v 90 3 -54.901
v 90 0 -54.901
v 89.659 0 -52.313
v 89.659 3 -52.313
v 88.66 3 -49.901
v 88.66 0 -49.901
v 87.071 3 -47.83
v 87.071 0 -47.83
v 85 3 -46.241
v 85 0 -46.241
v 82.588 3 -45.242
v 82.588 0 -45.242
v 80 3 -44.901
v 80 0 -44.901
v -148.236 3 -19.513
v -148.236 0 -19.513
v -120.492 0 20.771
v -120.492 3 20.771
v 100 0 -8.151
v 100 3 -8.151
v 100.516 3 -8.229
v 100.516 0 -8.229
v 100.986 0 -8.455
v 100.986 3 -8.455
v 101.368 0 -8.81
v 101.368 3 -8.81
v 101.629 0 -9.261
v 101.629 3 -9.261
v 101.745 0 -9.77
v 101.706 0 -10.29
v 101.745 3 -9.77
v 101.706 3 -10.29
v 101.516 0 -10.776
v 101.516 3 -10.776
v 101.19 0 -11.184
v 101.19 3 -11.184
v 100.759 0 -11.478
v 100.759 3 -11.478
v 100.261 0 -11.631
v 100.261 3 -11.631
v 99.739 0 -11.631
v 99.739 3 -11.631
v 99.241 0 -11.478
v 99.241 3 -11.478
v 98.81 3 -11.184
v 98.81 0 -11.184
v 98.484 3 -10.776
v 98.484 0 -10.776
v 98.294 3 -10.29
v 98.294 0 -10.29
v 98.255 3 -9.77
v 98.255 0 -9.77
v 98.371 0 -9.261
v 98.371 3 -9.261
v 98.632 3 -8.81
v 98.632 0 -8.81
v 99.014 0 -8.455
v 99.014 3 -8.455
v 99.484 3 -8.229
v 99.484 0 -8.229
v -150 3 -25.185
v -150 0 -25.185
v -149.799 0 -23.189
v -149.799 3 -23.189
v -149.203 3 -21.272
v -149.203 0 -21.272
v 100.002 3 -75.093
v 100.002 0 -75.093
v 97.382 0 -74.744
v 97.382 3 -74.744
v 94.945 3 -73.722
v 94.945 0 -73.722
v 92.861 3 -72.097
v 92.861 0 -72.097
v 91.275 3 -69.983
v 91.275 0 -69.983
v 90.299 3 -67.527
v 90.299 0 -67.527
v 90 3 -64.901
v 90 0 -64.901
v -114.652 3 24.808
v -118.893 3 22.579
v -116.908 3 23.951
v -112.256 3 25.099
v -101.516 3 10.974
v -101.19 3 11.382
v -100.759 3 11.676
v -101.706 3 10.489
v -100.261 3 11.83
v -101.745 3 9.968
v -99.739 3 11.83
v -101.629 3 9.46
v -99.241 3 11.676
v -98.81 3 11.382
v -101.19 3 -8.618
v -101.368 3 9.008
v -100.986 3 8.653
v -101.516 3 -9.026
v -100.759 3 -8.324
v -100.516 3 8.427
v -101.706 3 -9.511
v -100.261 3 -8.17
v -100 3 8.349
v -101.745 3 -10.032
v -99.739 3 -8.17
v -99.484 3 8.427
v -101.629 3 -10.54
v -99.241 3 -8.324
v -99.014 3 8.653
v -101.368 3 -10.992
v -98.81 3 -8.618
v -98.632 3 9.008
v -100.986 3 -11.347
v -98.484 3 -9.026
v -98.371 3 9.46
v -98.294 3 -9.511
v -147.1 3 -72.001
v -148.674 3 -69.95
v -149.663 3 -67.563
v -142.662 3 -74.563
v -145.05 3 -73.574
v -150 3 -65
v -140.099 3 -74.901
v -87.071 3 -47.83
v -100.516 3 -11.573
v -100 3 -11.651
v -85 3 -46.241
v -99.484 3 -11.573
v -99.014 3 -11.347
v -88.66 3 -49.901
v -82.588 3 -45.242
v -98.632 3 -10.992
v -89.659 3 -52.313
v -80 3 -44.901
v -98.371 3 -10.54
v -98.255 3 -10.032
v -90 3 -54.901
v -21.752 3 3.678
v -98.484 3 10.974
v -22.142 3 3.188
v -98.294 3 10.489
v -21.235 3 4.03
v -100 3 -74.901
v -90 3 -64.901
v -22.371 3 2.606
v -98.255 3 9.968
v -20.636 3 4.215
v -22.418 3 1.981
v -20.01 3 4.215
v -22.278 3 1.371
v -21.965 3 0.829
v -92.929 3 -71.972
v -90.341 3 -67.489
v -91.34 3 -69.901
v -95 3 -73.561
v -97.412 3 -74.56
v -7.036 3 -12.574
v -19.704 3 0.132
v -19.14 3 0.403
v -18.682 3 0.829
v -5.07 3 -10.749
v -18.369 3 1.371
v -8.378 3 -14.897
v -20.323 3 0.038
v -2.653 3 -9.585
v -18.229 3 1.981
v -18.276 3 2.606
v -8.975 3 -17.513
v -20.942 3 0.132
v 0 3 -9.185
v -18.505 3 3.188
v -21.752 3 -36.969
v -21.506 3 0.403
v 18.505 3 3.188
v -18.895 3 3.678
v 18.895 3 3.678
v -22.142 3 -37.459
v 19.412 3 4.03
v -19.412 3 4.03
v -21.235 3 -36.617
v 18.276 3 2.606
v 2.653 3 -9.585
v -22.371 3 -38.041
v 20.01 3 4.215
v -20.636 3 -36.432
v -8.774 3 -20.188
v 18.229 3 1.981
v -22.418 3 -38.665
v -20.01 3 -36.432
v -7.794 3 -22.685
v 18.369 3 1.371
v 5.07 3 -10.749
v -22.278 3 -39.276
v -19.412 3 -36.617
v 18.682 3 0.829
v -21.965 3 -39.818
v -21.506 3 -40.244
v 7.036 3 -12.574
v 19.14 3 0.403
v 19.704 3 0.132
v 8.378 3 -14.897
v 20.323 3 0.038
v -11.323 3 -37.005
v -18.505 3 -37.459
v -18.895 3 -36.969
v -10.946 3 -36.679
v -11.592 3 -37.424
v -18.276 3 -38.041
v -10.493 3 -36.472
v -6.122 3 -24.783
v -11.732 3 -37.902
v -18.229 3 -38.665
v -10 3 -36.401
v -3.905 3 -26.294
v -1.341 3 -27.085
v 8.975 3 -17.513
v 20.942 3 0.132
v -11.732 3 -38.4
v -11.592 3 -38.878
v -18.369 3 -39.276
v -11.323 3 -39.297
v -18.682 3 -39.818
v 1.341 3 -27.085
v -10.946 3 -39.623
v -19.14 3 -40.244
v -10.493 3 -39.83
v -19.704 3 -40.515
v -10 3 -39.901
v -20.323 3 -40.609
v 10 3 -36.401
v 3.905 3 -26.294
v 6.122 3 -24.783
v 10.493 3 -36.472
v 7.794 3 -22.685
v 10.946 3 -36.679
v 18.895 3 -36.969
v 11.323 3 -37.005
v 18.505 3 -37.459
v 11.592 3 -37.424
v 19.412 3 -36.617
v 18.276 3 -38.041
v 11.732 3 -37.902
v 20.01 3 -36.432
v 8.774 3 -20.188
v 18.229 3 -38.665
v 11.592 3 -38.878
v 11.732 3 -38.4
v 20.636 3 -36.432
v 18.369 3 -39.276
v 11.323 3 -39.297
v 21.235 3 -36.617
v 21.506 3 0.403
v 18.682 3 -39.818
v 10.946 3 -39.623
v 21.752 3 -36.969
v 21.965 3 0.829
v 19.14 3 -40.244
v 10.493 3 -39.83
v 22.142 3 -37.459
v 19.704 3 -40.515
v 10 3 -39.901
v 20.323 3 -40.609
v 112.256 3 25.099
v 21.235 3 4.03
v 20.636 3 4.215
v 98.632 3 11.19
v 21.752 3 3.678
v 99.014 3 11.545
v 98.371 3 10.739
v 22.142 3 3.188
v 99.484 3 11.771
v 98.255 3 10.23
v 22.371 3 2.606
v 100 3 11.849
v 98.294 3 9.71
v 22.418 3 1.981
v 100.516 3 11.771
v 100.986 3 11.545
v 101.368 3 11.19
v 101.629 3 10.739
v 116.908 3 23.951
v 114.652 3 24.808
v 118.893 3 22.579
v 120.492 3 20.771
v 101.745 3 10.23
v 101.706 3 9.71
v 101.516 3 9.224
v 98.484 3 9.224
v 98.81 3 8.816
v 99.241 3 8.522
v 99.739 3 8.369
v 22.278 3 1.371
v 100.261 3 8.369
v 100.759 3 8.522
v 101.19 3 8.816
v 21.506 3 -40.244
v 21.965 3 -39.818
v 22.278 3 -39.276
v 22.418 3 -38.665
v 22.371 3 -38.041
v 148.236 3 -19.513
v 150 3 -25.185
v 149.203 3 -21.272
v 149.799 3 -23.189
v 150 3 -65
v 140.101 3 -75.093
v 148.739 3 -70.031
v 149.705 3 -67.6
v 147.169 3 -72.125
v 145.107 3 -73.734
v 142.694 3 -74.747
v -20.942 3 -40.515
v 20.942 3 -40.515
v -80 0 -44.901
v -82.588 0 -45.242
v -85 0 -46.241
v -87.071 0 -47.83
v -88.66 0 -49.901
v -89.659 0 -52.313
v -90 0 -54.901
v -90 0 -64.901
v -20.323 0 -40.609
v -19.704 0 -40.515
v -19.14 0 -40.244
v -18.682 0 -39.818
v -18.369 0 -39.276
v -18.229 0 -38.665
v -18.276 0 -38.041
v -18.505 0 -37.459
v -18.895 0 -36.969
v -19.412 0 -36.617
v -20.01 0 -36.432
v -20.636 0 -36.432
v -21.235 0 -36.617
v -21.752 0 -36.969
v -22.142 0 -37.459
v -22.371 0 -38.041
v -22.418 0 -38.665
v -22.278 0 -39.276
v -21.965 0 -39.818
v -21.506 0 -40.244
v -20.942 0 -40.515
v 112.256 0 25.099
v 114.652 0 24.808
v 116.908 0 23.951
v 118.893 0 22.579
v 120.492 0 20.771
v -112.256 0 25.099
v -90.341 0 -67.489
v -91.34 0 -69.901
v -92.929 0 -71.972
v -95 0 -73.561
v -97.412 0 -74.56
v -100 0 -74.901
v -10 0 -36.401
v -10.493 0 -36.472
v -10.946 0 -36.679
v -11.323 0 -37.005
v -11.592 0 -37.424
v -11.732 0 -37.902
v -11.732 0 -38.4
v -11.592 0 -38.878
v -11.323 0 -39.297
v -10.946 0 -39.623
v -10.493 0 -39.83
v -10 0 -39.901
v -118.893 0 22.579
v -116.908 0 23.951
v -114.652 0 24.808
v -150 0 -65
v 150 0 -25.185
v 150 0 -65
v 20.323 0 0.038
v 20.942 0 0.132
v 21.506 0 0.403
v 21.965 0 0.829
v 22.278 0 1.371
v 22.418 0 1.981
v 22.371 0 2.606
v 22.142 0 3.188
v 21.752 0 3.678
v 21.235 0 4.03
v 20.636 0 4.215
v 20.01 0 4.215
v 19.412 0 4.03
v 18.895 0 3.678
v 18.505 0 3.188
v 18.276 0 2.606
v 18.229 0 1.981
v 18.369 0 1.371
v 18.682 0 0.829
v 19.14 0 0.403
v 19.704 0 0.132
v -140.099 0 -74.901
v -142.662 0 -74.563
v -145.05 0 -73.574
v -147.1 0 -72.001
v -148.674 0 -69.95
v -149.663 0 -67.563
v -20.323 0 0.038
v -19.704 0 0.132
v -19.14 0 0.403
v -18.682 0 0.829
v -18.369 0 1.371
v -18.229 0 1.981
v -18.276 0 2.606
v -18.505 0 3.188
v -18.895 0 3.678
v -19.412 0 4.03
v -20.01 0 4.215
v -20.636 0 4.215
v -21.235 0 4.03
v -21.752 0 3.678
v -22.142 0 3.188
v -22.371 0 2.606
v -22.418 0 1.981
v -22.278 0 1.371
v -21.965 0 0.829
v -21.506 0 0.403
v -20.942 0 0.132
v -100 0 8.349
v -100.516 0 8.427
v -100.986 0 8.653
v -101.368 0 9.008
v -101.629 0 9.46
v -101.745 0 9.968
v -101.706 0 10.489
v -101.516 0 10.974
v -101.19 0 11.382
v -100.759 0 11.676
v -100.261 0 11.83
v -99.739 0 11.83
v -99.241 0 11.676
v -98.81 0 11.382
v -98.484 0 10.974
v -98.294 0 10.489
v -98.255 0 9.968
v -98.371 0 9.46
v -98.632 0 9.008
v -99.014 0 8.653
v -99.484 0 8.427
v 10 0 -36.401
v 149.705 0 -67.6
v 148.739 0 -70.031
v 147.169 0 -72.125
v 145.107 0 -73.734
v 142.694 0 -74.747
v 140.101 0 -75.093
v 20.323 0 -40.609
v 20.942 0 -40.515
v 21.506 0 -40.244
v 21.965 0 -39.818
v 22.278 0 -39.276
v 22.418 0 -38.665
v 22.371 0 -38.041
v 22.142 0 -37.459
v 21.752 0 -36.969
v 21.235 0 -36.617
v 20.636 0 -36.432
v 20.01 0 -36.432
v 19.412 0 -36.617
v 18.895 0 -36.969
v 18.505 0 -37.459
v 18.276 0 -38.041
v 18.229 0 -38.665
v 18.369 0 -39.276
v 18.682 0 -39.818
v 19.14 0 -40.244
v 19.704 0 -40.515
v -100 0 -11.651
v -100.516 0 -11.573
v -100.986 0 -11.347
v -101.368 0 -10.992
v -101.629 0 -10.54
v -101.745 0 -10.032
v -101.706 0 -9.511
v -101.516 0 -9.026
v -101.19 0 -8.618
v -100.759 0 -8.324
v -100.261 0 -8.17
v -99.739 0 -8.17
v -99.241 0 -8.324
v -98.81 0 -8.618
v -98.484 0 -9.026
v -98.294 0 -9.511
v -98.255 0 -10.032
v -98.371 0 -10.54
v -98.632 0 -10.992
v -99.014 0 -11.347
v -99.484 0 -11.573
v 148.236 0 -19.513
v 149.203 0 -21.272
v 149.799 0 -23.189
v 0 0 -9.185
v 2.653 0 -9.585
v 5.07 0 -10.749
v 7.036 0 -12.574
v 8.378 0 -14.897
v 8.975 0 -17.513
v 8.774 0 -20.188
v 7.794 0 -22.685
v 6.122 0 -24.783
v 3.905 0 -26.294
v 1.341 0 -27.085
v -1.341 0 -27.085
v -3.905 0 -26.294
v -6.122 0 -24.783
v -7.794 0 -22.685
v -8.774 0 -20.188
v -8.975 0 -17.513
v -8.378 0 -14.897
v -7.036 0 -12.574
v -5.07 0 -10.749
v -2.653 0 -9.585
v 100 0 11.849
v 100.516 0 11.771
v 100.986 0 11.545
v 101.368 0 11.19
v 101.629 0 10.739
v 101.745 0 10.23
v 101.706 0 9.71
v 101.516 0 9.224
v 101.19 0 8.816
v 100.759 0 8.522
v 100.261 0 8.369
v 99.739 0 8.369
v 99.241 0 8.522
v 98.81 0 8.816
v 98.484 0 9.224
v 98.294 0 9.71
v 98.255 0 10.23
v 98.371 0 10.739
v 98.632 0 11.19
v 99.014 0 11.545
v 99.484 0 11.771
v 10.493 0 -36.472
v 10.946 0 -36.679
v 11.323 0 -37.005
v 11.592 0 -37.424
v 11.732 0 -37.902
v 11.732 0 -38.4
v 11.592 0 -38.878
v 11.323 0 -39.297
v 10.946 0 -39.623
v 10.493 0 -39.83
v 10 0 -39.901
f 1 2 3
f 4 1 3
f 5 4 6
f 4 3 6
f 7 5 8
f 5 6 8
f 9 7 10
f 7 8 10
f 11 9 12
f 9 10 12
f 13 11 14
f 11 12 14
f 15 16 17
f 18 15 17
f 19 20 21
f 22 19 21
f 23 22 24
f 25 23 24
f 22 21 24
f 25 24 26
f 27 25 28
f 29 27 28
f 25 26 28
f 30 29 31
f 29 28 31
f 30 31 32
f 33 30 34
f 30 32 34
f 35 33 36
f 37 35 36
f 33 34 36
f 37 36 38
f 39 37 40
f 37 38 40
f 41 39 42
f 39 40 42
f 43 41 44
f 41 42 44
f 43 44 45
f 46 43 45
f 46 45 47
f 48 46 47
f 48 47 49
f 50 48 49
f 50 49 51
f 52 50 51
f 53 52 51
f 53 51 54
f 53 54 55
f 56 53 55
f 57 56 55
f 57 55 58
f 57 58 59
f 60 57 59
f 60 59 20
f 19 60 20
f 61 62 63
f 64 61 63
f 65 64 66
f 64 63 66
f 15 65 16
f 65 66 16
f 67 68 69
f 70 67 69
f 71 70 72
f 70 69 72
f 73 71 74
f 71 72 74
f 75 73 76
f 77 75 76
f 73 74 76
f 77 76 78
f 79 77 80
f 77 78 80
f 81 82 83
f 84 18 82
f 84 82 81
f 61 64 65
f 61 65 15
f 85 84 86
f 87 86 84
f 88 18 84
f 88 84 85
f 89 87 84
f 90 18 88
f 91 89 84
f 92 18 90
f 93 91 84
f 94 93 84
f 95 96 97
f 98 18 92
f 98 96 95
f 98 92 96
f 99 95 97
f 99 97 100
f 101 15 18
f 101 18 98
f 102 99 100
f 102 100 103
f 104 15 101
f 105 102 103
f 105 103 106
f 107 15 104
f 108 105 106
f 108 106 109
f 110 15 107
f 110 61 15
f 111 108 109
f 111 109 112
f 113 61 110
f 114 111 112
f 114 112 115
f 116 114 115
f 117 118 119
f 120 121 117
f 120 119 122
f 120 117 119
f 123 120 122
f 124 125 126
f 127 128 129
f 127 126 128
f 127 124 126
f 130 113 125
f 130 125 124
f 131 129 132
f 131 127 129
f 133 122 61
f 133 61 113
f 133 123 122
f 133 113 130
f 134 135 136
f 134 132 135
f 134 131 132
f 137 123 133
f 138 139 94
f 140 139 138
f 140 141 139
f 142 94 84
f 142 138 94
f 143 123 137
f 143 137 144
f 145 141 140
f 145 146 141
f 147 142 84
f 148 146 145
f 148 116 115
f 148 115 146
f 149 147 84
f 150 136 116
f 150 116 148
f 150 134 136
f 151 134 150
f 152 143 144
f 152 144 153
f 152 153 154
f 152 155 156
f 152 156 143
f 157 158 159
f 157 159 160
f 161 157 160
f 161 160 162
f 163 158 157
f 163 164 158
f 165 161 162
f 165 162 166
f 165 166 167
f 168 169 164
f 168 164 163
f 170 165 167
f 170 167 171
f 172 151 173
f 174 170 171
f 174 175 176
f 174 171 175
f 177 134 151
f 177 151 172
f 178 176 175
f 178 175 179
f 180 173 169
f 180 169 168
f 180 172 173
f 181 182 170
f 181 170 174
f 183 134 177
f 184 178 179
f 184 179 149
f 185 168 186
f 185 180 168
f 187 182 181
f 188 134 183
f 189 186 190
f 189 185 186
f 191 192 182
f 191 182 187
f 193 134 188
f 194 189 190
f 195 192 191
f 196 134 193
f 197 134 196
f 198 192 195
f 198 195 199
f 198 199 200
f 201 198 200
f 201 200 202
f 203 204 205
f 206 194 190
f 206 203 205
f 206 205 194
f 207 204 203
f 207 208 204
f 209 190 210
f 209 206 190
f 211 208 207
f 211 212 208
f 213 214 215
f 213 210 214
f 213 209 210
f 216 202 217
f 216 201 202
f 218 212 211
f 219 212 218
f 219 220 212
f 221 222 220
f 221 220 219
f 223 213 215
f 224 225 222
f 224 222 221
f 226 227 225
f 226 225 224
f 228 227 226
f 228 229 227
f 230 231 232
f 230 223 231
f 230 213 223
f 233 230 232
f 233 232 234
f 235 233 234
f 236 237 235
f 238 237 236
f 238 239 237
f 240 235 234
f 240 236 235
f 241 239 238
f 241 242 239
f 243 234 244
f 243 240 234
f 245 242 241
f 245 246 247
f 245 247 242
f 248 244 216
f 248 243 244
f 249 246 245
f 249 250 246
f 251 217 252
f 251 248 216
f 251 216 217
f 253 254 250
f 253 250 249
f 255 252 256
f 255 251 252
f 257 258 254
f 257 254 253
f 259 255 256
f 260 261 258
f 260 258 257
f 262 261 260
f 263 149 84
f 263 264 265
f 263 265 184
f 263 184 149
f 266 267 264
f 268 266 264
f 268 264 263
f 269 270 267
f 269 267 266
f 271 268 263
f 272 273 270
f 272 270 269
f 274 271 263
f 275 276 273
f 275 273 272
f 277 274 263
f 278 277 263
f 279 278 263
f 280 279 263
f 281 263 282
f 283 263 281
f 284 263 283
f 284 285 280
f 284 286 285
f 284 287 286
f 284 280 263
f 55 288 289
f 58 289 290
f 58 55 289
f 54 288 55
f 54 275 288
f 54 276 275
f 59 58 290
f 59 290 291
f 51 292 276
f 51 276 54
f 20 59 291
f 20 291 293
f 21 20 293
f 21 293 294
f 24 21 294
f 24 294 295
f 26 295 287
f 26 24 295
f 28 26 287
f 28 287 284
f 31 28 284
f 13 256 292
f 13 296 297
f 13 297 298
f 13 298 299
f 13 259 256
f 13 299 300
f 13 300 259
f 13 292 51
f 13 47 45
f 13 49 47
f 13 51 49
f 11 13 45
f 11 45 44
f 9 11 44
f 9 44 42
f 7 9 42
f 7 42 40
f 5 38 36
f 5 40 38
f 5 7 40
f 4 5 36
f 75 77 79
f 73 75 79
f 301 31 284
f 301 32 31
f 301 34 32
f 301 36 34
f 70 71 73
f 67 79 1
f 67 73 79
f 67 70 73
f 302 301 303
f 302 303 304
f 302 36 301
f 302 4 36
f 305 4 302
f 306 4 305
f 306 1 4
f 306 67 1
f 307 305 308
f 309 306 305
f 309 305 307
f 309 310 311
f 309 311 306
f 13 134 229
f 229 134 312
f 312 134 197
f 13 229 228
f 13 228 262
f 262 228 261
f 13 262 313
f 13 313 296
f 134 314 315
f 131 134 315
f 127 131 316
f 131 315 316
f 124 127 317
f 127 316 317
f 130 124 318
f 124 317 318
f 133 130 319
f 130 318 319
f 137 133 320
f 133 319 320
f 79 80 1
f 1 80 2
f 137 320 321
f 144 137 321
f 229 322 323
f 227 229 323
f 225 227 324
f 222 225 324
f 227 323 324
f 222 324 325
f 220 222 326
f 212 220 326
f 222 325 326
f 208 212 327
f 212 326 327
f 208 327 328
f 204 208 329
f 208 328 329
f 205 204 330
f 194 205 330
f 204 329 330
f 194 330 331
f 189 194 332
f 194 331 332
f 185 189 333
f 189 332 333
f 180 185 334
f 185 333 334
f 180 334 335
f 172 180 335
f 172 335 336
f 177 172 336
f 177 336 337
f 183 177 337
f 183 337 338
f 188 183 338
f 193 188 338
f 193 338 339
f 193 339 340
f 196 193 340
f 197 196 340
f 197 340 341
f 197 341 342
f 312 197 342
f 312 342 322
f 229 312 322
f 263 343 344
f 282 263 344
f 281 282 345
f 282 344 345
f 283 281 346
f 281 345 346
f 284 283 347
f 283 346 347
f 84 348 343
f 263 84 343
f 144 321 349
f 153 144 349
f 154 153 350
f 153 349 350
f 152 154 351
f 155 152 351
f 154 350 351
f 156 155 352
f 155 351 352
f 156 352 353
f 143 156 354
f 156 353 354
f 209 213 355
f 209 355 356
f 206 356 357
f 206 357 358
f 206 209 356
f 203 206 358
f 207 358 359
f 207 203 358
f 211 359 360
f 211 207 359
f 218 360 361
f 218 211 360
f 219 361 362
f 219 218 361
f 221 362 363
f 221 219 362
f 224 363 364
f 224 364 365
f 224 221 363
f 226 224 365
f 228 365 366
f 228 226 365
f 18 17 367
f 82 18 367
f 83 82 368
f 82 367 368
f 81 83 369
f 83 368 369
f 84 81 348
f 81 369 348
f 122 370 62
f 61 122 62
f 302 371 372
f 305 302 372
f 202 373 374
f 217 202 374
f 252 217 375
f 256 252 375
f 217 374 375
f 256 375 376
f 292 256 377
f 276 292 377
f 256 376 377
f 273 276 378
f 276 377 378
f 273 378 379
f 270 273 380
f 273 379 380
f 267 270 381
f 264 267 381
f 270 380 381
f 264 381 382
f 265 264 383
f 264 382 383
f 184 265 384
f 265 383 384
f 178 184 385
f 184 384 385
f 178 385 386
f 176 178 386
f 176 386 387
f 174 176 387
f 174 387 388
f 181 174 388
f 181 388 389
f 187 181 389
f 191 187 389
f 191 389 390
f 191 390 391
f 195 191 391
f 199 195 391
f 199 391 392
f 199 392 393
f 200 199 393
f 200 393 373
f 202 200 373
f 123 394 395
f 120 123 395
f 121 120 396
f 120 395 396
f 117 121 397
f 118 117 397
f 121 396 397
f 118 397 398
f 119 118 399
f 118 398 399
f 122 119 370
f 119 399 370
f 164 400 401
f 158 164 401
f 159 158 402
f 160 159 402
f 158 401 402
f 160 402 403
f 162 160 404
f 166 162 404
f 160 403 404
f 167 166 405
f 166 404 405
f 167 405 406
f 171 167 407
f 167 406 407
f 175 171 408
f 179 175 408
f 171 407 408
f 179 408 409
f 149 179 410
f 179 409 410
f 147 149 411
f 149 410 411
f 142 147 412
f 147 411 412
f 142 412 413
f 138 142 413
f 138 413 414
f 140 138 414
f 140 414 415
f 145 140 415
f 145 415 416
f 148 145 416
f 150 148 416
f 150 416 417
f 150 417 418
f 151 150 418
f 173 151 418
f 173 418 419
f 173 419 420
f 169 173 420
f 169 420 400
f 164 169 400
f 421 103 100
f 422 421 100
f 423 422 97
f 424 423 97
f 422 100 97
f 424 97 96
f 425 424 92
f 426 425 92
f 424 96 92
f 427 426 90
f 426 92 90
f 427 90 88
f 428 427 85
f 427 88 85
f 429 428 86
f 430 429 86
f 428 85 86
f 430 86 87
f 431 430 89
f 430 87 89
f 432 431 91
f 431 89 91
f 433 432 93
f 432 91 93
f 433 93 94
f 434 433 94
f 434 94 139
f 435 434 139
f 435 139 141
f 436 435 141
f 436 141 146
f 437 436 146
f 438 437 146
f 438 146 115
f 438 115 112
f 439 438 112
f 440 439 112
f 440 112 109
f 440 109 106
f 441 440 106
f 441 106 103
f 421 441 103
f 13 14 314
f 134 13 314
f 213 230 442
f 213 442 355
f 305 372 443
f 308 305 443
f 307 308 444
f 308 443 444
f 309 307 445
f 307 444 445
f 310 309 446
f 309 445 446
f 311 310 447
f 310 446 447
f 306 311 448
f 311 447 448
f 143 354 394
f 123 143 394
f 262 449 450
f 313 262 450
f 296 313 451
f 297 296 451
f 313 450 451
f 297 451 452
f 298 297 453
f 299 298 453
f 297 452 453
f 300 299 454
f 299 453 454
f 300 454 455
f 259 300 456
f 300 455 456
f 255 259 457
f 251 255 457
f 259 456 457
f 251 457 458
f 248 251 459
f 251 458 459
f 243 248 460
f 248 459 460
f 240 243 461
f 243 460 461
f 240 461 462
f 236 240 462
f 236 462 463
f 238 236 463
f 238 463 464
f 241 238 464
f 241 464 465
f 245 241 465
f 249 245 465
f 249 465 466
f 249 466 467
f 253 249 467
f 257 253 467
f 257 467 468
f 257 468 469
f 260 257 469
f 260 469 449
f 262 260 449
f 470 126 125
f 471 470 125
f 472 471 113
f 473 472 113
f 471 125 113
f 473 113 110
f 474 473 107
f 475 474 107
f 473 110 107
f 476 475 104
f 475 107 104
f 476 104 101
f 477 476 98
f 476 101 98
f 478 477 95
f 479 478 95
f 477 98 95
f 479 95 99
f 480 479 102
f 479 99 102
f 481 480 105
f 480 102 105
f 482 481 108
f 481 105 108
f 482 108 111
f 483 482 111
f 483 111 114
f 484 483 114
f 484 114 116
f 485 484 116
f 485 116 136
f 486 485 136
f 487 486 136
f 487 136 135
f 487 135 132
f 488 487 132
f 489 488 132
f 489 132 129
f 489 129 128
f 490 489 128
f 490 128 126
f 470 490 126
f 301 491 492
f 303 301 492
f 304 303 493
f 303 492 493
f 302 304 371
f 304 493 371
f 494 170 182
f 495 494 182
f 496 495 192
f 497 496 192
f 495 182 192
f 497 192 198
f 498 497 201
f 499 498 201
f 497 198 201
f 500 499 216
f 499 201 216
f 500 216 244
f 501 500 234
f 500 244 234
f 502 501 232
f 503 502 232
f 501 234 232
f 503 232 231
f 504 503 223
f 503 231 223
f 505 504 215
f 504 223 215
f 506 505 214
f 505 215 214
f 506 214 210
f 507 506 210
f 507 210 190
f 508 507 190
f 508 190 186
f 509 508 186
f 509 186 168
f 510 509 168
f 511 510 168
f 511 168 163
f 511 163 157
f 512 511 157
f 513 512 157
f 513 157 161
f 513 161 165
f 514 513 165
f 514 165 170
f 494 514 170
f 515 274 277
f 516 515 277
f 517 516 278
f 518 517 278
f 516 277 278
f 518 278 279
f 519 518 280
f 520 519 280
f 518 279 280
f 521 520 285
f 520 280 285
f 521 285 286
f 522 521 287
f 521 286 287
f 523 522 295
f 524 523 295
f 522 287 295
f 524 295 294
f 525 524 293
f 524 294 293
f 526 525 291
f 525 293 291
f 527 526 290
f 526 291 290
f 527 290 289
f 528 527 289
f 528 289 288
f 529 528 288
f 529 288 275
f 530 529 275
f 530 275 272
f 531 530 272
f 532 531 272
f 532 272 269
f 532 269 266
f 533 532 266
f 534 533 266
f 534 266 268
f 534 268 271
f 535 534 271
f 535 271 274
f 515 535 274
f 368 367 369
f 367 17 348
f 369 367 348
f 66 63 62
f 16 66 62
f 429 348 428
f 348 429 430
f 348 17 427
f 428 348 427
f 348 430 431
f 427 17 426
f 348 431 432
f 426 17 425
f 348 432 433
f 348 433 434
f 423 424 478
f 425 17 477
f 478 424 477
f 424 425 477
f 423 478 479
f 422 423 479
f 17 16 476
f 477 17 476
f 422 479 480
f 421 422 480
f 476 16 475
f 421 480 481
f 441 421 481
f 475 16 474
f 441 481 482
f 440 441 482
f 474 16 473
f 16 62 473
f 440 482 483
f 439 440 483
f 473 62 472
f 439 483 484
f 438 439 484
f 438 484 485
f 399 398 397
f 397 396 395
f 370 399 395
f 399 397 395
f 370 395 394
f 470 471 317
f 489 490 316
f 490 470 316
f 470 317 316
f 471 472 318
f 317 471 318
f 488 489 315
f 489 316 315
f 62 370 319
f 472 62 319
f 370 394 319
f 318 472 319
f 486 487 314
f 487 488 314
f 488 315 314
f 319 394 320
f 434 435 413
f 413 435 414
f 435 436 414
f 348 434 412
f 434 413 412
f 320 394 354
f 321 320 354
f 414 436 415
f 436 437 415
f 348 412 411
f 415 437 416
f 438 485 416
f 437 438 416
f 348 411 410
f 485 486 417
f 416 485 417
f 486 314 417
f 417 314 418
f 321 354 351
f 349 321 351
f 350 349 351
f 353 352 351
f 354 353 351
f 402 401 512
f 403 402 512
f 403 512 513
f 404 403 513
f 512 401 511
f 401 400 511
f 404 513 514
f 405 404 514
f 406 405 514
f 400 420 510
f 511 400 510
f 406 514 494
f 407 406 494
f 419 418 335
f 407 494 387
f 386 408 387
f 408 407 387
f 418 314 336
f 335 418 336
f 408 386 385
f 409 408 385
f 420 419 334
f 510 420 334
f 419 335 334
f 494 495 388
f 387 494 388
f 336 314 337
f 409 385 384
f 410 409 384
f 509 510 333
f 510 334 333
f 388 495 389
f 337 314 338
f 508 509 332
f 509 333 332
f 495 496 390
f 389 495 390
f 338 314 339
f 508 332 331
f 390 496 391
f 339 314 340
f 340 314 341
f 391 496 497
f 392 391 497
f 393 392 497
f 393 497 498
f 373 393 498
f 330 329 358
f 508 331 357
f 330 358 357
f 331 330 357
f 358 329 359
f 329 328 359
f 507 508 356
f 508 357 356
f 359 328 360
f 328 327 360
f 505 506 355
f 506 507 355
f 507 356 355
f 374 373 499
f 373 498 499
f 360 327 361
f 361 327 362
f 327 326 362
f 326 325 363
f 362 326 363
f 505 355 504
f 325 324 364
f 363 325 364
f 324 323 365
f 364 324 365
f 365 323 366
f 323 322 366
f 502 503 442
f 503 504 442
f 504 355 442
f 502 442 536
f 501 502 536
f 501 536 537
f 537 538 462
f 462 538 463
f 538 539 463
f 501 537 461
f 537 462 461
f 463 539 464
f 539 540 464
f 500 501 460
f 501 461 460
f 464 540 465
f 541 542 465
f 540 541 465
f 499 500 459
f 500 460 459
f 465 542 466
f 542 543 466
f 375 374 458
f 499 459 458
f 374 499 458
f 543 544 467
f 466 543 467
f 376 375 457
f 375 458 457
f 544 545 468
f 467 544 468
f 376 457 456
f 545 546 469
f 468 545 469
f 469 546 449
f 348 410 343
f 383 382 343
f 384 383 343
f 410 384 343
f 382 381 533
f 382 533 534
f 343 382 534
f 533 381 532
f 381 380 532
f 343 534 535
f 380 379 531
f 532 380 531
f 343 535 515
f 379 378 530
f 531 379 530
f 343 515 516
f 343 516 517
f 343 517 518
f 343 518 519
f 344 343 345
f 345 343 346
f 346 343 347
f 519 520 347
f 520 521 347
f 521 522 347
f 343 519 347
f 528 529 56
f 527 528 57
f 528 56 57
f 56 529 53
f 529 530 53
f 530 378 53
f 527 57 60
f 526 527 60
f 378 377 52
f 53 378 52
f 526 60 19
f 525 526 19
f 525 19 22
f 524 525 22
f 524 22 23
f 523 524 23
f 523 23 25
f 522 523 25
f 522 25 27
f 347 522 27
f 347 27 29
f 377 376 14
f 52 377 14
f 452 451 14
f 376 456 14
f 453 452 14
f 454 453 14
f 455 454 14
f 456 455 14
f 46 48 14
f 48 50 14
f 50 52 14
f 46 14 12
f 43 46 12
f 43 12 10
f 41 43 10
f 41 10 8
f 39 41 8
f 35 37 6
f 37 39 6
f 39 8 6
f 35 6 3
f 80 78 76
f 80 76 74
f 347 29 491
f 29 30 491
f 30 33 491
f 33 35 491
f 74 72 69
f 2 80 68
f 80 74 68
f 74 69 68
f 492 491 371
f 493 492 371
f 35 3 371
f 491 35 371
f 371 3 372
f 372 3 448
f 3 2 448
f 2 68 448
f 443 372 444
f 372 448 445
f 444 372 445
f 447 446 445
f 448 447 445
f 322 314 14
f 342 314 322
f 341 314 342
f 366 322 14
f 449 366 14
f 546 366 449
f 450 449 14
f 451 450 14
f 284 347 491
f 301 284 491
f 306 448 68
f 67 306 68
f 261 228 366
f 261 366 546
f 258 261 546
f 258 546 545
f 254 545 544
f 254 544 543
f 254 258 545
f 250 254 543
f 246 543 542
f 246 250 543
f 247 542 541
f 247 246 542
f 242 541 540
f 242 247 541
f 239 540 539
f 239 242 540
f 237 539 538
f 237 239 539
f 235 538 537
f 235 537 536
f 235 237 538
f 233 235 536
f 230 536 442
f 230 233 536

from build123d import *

# Parameters (mm, degrees)
EXTRUDE_1_DEPTH     = 3
SKETCH_2_R          = 1.75
CUT_EXTRUDE_1_DEPTH = 10
CUT_EXTRUDE_2_DEPTH = 3
SKETCH_4_R          = 9
CUT_EXTRUDE_3_DEPTH = 10
SKETCH_5_R          = 2.1
CUT_EXTRUDE_4_DEPTH = 4


with BuildPart() as part:
    # 草图1 → 凸台-拉伸1 (new body)
    with BuildSketch(Plane(origin=(0, 0, 0), x_dir=(1, 0, 0), z_dir=(0, 1, 0))):
        with BuildLine():
            Line((-148.235829522, 19.513411872), (-120.492131082, -20.771152042))
            ThreePointArc((-120.492131082, -20.771152042), (-116.908205257, -23.951300285), (-112.25630156, -25.099193643))
            Line((-112.25630156, -25.099193643), (112.25630156, -25.099193643))
            ThreePointArc((112.25630156, -25.099193643), (116.908205257, -23.951300285), (120.492131082, -20.771152042))
            Line((120.492131082, -20.771152042), (148.235829522, 19.513411872))
            ThreePointArc((148.235829522, 19.513411872), (149.548777283, 22.215378286), (150, 25.185370271))
            Line((150, 25.185370271), (150, 65))
            ThreePointArc((150, 65), (147.169490918, 72.124628896), (140.101052961, 75.092675968))
            Line((140.101052961, 75.092675968), (100.001859318, 75.092675968))
            ThreePointArc((100.001859318, 75.092675968), (92.860872953, 72.096900105), (90, 64.900806357))
            Line((90, 64.900806357), (90, 54.900806357))
            ThreePointArc((90, 54.900806357), (87.071067812, 47.829738545), (80, 44.900806357))
            Line((80, 44.900806357), (-80, 44.900806357))
            ThreePointArc((-80, 44.900806357), (-87.071067812, 47.829738545), (-90, 54.900806357))
            Line((-90, 54.900806357), (-90, 64.900806357))
            ThreePointArc((-90, 64.900806357), (-92.928932188, 71.971874169), (-100, 74.900806357))
            Line((-100, 74.900806357), (-140.099193643, 74.900806357))
            ThreePointArc((-140.099193643, 74.900806357), (-147.100120957, 72.000927314), (-150, 65))
            Line((-150, 65), (-150, 25.185370271))
            ThreePointArc((-150, 25.185370271), (-149.548777283, 22.215378286), (-148.235829522, 19.513411872))
        make_face()
    extrude(amount=EXTRUDE_1_DEPTH)

    # 草图2 → 切除-拉伸1 (cut)
    with BuildSketch(Plane(origin=(0, 3, 0), x_dir=(1, 0, 0), z_dir=(0, 1, 0))):
        with Locations(Location((100, 9.900806357, 0), (0, 0, 270))):
            Circle(SKETCH_2_R)
        with Locations(Location((100, -10.099193643, 0), (0, 0, 270))):
            Circle(SKETCH_2_R)
        with Locations(Location((-100, -10.099193643, 0), (0, 0, 90))):
            Circle(SKETCH_2_R)
        with Locations(Location((-100, 9.900806357, 0), (0, 0, 90))):
            Circle(SKETCH_2_R)
    extrude(amount=-CUT_EXTRUDE_1_DEPTH, mode=Mode.SUBTRACT)

    # 草图3 → 切除-拉伸2 (cut)
    with BuildSketch(Plane(origin=(0, 3, 0), x_dir=(1, 0, 0), z_dir=(0, 1, 0))):
        with BuildLine():
            Line((-10, 39.900806357), (10, 39.900806357))
            ThreePointArc((10, 39.900806357), (11.75, 38.150806357), (10, 36.400806357))
            Line((10, 36.400806357), (-10, 36.400806357))
            ThreePointArc((-10, 36.400806357), (-11.75, 38.150806357), (-10, 39.900806357))
        make_face()
    extrude(amount=-CUT_EXTRUDE_2_DEPTH, mode=Mode.SUBTRACT)

    # 草图4 → 切除-拉伸3 (cut)
    with BuildSketch(Plane(origin=(0, 3, 0), x_dir=(1, 0, 0), z_dir=(0, 1, 0))):
        with Locations(Location((0, 18.185077605, 0), (0, 0, 270))):
            Circle(SKETCH_4_R)
    extrude(amount=-CUT_EXTRUDE_3_DEPTH, mode=Mode.SUBTRACT)

    # 草图5 → 切除-拉伸4 (cut)
    with BuildSketch(Plane.XZ):
        with Locations(Location((-20.323459578, 2.138381974, 0), (0, 0, 270))):
            Circle(SKETCH_5_R)
        with Locations(Location((20.323459578, 2.138381974, 0), (0, 0, 270))):
            Circle(SKETCH_5_R)
        with Locations(Location((20.323459578, -38.508537183, 0), (0, 0, 270))):
            Circle(SKETCH_5_R)
        with Locations(Location((-20.323459578, -38.508537183, 0), (0, 0, 270))):
            Circle(SKETCH_5_R)
    extrude(amount=-CUT_EXTRUDE_4_DEPTH, mode=Mode.SUBTRACT)


solid = part.part
